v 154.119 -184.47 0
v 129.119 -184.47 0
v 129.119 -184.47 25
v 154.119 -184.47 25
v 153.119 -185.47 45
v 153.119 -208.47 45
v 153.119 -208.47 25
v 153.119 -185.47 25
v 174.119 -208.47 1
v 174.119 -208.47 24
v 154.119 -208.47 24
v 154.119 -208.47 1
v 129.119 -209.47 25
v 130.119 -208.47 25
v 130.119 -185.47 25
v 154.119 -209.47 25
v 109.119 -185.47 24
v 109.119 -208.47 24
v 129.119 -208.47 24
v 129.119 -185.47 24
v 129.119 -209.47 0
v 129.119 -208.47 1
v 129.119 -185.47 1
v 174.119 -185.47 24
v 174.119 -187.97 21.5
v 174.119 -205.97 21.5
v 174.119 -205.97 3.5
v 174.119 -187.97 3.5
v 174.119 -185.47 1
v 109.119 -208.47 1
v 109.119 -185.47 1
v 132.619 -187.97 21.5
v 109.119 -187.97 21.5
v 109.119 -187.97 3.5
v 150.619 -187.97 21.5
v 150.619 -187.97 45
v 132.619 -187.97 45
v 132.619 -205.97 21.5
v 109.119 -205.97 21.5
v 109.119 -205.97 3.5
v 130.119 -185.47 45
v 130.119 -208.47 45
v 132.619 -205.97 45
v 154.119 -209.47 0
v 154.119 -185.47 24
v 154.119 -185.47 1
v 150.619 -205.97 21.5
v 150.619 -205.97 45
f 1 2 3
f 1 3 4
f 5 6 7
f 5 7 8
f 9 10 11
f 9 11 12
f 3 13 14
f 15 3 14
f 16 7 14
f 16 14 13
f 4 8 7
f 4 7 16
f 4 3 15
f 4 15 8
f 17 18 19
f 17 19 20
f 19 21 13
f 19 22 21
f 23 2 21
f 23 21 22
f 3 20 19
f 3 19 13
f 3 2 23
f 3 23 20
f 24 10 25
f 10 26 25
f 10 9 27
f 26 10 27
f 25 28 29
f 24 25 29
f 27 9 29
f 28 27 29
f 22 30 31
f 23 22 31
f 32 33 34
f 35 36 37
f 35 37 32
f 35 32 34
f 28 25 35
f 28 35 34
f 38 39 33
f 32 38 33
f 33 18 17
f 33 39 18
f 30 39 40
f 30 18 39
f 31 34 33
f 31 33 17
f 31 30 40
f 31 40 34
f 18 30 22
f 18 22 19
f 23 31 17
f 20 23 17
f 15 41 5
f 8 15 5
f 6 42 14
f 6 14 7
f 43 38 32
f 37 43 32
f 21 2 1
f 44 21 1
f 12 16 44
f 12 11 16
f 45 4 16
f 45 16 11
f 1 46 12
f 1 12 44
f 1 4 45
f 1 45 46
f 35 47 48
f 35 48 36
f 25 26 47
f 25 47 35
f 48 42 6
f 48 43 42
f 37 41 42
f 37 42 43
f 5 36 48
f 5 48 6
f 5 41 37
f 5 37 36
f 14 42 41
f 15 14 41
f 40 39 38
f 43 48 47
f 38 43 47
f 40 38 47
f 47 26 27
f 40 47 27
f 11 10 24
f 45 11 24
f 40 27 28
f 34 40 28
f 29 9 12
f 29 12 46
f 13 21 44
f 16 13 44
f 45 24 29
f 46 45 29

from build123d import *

# Parameters (mm, degrees)
SKETCH1_W           = 65
SKETCH1_H           = 25
BOSS_EXTRUDE1_DEPTH = 25
SKETCH2_W           = 25
SKETCH2_H           = 25
BOSS_EXTRUDE2_DEPTH = 20
SKETCH3_W           = 25
SKETCH3_H           = 25
SKETCH3_W_2         = 23
SKETCH3_H_2         = 23
CUT_EXTRUDE2_DEPTH  = 20
SKETCH4_W           = 25
SKETCH4_H           = 25
SKETCH4_W_2         = 23
SKETCH4_H_2         = 23
CUT_EXTRUDE3_DEPTH  = 20
SKETCH5_W           = 25
SKETCH5_H           = 25
SKETCH5_W_2         = 23
SKETCH5_H_2         = 23
CUT_EXTRUDE4_DEPTH  = 20
SKETCH6_W           = 18
SKETCH6_H           = 18
CUT_EXTRUDE5_DEPTH  = 224.89200104
SKETCH7_W           = 18
SKETCH7_H           = 18
CUT_EXTRUDE6_DEPTH  = 41.5


with BuildPart() as part:
    # Sketch1 → Boss-Extrude1 (new body)
    with BuildSketch(Plane.XY):
        with Locations((141.619238947, -196.969874038)):
            Rectangle(SKETCH1_W, SKETCH1_H)
    extrude(amount=BOSS_EXTRUDE1_DEPTH)

    # Sketch2 → Boss-Extrude2 (add)
    with BuildSketch(Plane.XY.offset(25)):
        with Locations((141.619238947, -196.969874038)):
            Rectangle(SKETCH2_W, SKETCH2_H)
    extrude(amount=BOSS_EXTRUDE2_DEPTH)

    # Sketch3 → Cut-Extrude2 (cut)
    with BuildSketch(Plane.XY.offset(45)):
        with Locations((141.619238947, -196.969874038)):
            Rectangle(SKETCH3_W, SKETCH3_H)
        with Locations((141.619238947, -196.969874038)):
            Rectangle(SKETCH3_W_2, SKETCH3_H_2, mode=Mode.SUBTRACT)
    extrude(amount=-CUT_EXTRUDE2_DEPTH, mode=Mode.SUBTRACT)

    # Sketch4 → Cut-Extrude3 (cut)
    with BuildSketch(Plane.ZY.offset(-109.119238947)):
        with Locations((12.5, -196.969874038)):
            Rectangle(SKETCH4_W, SKETCH4_H)
        with Locations((12.5, -196.969874038)):
            Rectangle(SKETCH4_W_2, SKETCH4_H_2, mode=Mode.SUBTRACT)
    extrude(amount=-CUT_EXTRUDE3_DEPTH, mode=Mode.SUBTRACT)

    # Sketch5 → Cut-Extrude4 (cut)
    with BuildSketch(Plane(origin=(174.119238947, 0, 0), x_dir=(0, 0, -1), z_dir=(1, 0, 0))):
        with Locations((-12.5, -196.969874038)):
            Rectangle(SKETCH5_W, SKETCH5_H)
        with Locations((-12.5, -196.969874038)):
            Rectangle(SKETCH5_W_2, SKETCH5_H_2, mode=Mode.SUBTRACT)
    extrude(amount=-CUT_EXTRUDE4_DEPTH, mode=Mode.SUBTRACT)

    # Sketch6 → Cut-Extrude5 (cut, through all)
    with BuildSketch(Plane(origin=(174.119238947, 0, 0), x_dir=(0, 0, -1), z_dir=(1, 0, 0))):
        with Locations((-12.5, -196.969874038)):
            Rectangle(SKETCH6_W, SKETCH6_H)
    extrude(amount=-CUT_EXTRUDE5_DEPTH, mode=Mode.SUBTRACT)

    # Sketch7 → Cut-Extrude6 (cut)
    with BuildSketch(Plane.XY.offset(45)):
        with Locations((141.619238947, -196.969874038)):
            Rectangle(SKETCH7_W, SKETCH7_H)
    extrude(amount=-CUT_EXTRUDE6_DEPTH, mode=Mode.SUBTRACT)


solid = part.part
